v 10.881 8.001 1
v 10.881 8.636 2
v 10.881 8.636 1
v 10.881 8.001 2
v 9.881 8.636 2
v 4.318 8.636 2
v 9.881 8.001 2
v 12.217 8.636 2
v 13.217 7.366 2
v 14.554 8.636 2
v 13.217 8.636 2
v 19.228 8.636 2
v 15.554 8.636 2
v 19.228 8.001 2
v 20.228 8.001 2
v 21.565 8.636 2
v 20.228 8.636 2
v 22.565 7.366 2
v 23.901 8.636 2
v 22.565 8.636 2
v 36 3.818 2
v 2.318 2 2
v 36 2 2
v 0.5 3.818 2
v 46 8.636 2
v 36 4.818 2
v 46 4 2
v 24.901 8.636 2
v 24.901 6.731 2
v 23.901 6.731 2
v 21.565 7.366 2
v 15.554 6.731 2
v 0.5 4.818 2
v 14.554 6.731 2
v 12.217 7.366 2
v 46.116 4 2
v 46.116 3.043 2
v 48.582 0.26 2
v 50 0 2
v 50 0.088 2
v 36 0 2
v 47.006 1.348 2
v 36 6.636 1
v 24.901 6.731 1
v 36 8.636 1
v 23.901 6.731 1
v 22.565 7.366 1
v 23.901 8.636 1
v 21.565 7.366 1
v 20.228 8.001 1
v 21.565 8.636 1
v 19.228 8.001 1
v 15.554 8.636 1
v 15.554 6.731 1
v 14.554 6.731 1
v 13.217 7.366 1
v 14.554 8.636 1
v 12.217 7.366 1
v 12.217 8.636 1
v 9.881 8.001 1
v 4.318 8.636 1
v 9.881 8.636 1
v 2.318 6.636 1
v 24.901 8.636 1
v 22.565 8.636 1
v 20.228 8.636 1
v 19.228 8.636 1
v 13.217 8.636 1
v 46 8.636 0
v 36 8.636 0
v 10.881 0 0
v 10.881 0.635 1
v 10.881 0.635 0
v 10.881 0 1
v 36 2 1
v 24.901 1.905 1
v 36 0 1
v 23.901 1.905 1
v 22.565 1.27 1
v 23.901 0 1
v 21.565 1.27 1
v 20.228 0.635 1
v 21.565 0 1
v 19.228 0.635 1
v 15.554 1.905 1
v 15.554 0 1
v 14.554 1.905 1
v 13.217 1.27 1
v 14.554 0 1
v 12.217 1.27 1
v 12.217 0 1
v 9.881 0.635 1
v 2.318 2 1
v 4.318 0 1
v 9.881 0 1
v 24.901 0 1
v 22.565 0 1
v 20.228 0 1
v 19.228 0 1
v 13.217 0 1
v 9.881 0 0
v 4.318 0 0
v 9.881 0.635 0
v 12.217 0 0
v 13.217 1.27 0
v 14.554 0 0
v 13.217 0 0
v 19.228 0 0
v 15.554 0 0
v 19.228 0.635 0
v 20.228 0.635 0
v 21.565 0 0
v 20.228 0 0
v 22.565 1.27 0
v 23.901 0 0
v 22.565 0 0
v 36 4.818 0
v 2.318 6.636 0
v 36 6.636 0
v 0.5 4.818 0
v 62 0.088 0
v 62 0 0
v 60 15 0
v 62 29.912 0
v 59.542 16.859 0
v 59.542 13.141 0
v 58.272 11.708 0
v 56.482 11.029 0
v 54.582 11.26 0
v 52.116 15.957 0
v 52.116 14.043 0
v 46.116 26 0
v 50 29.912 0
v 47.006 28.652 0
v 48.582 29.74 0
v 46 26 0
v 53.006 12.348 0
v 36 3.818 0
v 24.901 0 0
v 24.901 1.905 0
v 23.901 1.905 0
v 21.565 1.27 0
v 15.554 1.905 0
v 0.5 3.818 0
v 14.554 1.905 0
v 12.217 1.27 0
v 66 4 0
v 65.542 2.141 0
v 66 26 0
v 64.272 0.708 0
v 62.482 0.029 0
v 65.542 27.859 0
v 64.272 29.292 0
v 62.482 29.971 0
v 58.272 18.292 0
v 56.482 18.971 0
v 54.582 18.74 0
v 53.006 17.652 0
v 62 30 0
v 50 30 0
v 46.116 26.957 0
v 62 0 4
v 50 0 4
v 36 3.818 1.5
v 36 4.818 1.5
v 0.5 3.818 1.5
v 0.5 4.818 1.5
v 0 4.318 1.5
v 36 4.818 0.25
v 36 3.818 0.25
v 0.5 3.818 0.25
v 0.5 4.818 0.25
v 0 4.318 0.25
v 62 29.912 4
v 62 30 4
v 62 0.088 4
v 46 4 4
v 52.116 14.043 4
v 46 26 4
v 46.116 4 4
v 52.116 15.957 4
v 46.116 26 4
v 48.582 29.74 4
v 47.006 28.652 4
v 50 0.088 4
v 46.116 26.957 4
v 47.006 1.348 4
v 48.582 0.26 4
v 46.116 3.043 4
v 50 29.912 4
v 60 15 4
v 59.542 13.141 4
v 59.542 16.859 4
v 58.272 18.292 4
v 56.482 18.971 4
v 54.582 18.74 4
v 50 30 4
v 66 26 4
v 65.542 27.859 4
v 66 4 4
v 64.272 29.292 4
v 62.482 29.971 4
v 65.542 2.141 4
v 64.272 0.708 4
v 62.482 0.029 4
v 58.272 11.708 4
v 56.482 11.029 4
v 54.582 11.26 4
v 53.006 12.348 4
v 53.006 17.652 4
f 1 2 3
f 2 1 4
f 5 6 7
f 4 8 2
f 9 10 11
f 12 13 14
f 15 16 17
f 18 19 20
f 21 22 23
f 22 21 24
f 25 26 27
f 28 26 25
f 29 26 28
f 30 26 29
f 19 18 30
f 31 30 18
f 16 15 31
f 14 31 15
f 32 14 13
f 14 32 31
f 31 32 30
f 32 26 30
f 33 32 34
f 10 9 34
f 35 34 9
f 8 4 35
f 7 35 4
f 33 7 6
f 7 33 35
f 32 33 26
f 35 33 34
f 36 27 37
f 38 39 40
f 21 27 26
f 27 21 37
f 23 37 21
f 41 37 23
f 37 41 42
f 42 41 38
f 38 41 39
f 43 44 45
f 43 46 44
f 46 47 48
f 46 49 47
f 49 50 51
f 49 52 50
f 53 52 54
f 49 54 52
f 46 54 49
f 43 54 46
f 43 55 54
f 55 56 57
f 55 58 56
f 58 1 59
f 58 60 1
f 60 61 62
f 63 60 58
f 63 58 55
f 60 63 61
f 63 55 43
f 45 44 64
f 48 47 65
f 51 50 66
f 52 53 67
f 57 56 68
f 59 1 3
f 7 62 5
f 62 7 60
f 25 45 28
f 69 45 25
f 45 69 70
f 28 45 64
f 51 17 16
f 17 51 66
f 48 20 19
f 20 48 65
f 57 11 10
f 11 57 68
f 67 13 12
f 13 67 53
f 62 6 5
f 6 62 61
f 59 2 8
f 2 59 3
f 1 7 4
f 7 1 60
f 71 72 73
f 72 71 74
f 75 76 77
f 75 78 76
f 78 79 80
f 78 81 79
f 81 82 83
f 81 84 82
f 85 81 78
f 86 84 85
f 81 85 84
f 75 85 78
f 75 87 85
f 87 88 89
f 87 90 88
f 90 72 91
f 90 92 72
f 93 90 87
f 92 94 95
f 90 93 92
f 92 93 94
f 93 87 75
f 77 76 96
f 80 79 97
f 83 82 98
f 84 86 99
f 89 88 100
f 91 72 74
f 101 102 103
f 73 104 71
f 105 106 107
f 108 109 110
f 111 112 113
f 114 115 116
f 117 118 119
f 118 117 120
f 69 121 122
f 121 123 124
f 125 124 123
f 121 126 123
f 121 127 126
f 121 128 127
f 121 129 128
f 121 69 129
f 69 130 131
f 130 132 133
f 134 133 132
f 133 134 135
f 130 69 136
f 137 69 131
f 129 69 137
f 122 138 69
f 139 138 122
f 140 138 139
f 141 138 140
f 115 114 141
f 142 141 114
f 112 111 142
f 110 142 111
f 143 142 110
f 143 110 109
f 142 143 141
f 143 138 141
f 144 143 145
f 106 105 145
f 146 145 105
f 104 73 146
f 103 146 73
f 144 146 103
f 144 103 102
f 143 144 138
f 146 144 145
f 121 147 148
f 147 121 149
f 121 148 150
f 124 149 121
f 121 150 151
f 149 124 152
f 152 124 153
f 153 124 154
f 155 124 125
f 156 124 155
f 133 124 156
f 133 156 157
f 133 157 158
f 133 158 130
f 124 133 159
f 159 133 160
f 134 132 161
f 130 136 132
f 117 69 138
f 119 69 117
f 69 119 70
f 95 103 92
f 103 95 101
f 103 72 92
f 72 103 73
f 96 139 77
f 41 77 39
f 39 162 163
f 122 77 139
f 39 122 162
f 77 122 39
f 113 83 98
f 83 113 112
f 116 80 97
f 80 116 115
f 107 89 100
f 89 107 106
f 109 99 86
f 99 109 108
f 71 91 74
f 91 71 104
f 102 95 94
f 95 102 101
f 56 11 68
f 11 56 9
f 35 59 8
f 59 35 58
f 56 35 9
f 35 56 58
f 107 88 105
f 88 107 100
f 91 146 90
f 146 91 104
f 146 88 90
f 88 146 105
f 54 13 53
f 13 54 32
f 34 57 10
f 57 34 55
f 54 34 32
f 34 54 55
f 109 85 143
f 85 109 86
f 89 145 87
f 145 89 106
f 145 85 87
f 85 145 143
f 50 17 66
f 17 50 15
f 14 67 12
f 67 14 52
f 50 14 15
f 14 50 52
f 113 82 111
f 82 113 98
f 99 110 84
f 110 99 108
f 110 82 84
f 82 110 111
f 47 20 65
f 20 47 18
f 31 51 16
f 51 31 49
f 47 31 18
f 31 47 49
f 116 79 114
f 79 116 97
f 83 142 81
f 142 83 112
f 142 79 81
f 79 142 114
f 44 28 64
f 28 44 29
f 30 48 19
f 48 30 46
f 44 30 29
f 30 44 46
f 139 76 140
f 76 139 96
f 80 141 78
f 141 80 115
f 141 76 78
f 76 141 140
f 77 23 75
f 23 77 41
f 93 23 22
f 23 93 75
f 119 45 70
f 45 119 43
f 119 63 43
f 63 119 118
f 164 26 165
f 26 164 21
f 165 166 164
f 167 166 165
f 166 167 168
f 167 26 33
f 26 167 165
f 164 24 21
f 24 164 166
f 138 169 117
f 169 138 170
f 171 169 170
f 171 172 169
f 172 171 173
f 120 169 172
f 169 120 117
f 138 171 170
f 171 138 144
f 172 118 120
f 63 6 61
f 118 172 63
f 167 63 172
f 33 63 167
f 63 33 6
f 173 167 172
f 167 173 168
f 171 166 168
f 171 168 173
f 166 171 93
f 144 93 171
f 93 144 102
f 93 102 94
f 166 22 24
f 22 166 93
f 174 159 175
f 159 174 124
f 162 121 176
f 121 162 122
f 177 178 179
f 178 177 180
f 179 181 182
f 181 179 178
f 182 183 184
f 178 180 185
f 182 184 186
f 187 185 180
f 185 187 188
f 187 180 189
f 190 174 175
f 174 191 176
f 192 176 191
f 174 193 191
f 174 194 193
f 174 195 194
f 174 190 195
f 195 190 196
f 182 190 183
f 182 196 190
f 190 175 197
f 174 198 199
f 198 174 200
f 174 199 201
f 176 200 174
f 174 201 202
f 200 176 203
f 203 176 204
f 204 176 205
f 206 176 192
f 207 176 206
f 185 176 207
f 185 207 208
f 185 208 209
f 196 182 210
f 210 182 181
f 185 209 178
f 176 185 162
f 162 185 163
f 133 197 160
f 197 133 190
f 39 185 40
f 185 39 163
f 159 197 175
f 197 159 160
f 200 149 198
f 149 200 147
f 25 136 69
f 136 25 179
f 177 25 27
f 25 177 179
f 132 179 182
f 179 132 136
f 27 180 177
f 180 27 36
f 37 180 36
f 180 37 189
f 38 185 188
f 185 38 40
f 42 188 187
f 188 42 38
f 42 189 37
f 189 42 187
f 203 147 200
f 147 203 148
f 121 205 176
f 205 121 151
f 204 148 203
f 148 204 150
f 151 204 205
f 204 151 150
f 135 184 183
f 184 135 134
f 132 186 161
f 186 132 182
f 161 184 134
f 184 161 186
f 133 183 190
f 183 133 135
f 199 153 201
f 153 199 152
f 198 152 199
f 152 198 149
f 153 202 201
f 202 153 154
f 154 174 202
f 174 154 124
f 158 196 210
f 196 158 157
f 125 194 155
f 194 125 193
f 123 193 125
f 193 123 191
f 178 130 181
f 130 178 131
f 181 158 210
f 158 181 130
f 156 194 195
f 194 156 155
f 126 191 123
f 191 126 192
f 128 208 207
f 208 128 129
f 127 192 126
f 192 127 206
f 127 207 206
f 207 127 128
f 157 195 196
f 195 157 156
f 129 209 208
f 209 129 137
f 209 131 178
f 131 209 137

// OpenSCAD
// preview[view:north, tilt:top]

/* [Bitting 1-4] */
Depth_1		=	1; //[1,2,3,4]
Depth_2		=	2; //[1,2,3,4]
Depth_3		=	3; //[1,2,3,4]
Depth_4		=	4; //[1,2,3,4]
/* [Bitting 5-8] */
Depth_5		=	1; //[1,2,3,4]
Depth_6		=	2; //[1,2,3,4]
Depth_7		=	3; //[1,2,3,4]
Depth_8		=	4; //[1,2,3,4]
/* [Hidden] */
Key_Code    =   [Depth_1,Depth_2,Depth_3,Depth_4,Depth_5,Depth_6,Depth_7,Depth_8];// Key code Tip to Bow

//Module produces a cube with rounded corners
module rounded(size, r) {
    union() {
        translate([r, 0, 0]) cube([size[0]-2*r, size[1], size[2]]);
        translate([0, r, 0]) cube([size[0], size[1]-2*r, size[2]]);
        translate([r, r, 0]) cylinder(h=size[2], r=r);
        translate([size[0]-r, r, 0]) cylinder(h=size[2], r=r);
        translate([r, size[1]-r, 0]) cylinder(h=size[2], r=r);
        translate([size[0]-r, size[1]-r, 0]) cylinder(h=size[2], r=r);
    }
}


Blade_Len   = 55.0;
Blade_Width =  8.636; //Based on chart showing a #1 cut = 0.340"
Blade_Thk   =  2.0;

Ward1_Len   = 36.0;
Ward1_Width =  2.0;
Ward1_Thk   =  1.0;

Ward2_Len   = 36.0;
Ward2_Width =  1.0;
Ward2_Thk   =  0.5;

//Took Bit depth and spacing from a chart in inches.
//Define vectors and convert to mm
Depth_in    =   [0.340, 0.315, 0.290, 0.265];
Depth       =   Depth_in * 25.4;
echo("Depth:", Depth);
Bit_in      =   [0.296, 0.389, 0.481, 0.573, 0.665, 0.757, 0.849, 0.941];
Bit         =   Bit_in * 25.4;
echo(Bit);


//position of cut for ward 1A (Top side)
W1A_X = 0.0;
W1A_Y = 0.0;
W1A_Z = Blade_Thk - Ward1_Thk;

//position of cut for ward 1B (Bottom side)
W1B_X = 0.0;
W1B_Y = Blade_Width-Ward1_Width;
W1B_Z = 0.0;

//Ward 2 is a pair of central cuts down the center of the blade
//I'm defining the center of each cutout this time
W2_X =  Ward2_Len   / 2.0;
W2_Y =  Blade_Width / 2.0; //center of blade
W2A_Z=  Blade_Thk - (Ward2_Thk / 2.0);
W2B_Z=  0.0;


difference(){
                                            cube([Blade_Len,Blade_Width,Blade_Thk]); //Blade
    translate([W1A_X,W1A_Y,W1A_Z])          cube([Ward1_Len,Ward1_Width,Ward1_Thk]); //Warding 1A
    translate([W1B_X,W1B_Y,W1B_Z])          cube([Ward1_Len,Ward1_Width,Ward1_Thk]); //Warding 1B
    translate ([W2_X, W2_Y,W2A_Z])          cube([Ward2_Len,Ward2_Width,Ward2_Thk],true);//Warding 2A
    translate ([W2_X, W2_Y,W2B_Z])          cube([Ward2_Len,Ward2_Width,Ward2_Thk],true);//Warding 2B
    
	//cut out rectangular bits to correct depth pos 0-7, tip towards bow
	for(bit = [0:1:7]){
		translate([Bit[bit], Depth[Key_Code[bit]-1], W1A_Z]) #cube([1,Blade_Width-Depth[Key_Code[bit]-1],1]);
		translate([Bit[bit],                      0, W1B_Z]) #cube([1,Blade_Width-Depth[Key_Code[bit]-1],1]);
		}
   
    // No reason to get too fancy. Just cut off tip at a 45.
    translate ([ 0.0, Blade_Width / 2.0, 0.0])
    {rotate    ([0,0,45]) cube ([Blade_Width*0.71,Blade_Width*0.5, Blade_Thk]);}
    translate ([ 0.0, Blade_Width / 2.0, 0.0])
    {rotate    ([0,0,-135]) cube ([Blade_Width*0.5,Blade_Width*0.71, Blade_Thk]);}
    }
    

//Now let's add a simple handle 
Bow_Space   =   10.0;
H_Len   =   20.0;
H_Width =   30.0;
H_Thk   =   Blade_Thk + 2.0;

translate ([Ward1_Len+Bow_Space, 0.0, 0.0])
difference(){
                                                               rounded([H_Len,H_Width,H_Thk],4);
    translate ([H_Len/2, H_Width/2, H_Thk/2])  cylinder(h=H_Thk+10, r=4, center=true);
}
